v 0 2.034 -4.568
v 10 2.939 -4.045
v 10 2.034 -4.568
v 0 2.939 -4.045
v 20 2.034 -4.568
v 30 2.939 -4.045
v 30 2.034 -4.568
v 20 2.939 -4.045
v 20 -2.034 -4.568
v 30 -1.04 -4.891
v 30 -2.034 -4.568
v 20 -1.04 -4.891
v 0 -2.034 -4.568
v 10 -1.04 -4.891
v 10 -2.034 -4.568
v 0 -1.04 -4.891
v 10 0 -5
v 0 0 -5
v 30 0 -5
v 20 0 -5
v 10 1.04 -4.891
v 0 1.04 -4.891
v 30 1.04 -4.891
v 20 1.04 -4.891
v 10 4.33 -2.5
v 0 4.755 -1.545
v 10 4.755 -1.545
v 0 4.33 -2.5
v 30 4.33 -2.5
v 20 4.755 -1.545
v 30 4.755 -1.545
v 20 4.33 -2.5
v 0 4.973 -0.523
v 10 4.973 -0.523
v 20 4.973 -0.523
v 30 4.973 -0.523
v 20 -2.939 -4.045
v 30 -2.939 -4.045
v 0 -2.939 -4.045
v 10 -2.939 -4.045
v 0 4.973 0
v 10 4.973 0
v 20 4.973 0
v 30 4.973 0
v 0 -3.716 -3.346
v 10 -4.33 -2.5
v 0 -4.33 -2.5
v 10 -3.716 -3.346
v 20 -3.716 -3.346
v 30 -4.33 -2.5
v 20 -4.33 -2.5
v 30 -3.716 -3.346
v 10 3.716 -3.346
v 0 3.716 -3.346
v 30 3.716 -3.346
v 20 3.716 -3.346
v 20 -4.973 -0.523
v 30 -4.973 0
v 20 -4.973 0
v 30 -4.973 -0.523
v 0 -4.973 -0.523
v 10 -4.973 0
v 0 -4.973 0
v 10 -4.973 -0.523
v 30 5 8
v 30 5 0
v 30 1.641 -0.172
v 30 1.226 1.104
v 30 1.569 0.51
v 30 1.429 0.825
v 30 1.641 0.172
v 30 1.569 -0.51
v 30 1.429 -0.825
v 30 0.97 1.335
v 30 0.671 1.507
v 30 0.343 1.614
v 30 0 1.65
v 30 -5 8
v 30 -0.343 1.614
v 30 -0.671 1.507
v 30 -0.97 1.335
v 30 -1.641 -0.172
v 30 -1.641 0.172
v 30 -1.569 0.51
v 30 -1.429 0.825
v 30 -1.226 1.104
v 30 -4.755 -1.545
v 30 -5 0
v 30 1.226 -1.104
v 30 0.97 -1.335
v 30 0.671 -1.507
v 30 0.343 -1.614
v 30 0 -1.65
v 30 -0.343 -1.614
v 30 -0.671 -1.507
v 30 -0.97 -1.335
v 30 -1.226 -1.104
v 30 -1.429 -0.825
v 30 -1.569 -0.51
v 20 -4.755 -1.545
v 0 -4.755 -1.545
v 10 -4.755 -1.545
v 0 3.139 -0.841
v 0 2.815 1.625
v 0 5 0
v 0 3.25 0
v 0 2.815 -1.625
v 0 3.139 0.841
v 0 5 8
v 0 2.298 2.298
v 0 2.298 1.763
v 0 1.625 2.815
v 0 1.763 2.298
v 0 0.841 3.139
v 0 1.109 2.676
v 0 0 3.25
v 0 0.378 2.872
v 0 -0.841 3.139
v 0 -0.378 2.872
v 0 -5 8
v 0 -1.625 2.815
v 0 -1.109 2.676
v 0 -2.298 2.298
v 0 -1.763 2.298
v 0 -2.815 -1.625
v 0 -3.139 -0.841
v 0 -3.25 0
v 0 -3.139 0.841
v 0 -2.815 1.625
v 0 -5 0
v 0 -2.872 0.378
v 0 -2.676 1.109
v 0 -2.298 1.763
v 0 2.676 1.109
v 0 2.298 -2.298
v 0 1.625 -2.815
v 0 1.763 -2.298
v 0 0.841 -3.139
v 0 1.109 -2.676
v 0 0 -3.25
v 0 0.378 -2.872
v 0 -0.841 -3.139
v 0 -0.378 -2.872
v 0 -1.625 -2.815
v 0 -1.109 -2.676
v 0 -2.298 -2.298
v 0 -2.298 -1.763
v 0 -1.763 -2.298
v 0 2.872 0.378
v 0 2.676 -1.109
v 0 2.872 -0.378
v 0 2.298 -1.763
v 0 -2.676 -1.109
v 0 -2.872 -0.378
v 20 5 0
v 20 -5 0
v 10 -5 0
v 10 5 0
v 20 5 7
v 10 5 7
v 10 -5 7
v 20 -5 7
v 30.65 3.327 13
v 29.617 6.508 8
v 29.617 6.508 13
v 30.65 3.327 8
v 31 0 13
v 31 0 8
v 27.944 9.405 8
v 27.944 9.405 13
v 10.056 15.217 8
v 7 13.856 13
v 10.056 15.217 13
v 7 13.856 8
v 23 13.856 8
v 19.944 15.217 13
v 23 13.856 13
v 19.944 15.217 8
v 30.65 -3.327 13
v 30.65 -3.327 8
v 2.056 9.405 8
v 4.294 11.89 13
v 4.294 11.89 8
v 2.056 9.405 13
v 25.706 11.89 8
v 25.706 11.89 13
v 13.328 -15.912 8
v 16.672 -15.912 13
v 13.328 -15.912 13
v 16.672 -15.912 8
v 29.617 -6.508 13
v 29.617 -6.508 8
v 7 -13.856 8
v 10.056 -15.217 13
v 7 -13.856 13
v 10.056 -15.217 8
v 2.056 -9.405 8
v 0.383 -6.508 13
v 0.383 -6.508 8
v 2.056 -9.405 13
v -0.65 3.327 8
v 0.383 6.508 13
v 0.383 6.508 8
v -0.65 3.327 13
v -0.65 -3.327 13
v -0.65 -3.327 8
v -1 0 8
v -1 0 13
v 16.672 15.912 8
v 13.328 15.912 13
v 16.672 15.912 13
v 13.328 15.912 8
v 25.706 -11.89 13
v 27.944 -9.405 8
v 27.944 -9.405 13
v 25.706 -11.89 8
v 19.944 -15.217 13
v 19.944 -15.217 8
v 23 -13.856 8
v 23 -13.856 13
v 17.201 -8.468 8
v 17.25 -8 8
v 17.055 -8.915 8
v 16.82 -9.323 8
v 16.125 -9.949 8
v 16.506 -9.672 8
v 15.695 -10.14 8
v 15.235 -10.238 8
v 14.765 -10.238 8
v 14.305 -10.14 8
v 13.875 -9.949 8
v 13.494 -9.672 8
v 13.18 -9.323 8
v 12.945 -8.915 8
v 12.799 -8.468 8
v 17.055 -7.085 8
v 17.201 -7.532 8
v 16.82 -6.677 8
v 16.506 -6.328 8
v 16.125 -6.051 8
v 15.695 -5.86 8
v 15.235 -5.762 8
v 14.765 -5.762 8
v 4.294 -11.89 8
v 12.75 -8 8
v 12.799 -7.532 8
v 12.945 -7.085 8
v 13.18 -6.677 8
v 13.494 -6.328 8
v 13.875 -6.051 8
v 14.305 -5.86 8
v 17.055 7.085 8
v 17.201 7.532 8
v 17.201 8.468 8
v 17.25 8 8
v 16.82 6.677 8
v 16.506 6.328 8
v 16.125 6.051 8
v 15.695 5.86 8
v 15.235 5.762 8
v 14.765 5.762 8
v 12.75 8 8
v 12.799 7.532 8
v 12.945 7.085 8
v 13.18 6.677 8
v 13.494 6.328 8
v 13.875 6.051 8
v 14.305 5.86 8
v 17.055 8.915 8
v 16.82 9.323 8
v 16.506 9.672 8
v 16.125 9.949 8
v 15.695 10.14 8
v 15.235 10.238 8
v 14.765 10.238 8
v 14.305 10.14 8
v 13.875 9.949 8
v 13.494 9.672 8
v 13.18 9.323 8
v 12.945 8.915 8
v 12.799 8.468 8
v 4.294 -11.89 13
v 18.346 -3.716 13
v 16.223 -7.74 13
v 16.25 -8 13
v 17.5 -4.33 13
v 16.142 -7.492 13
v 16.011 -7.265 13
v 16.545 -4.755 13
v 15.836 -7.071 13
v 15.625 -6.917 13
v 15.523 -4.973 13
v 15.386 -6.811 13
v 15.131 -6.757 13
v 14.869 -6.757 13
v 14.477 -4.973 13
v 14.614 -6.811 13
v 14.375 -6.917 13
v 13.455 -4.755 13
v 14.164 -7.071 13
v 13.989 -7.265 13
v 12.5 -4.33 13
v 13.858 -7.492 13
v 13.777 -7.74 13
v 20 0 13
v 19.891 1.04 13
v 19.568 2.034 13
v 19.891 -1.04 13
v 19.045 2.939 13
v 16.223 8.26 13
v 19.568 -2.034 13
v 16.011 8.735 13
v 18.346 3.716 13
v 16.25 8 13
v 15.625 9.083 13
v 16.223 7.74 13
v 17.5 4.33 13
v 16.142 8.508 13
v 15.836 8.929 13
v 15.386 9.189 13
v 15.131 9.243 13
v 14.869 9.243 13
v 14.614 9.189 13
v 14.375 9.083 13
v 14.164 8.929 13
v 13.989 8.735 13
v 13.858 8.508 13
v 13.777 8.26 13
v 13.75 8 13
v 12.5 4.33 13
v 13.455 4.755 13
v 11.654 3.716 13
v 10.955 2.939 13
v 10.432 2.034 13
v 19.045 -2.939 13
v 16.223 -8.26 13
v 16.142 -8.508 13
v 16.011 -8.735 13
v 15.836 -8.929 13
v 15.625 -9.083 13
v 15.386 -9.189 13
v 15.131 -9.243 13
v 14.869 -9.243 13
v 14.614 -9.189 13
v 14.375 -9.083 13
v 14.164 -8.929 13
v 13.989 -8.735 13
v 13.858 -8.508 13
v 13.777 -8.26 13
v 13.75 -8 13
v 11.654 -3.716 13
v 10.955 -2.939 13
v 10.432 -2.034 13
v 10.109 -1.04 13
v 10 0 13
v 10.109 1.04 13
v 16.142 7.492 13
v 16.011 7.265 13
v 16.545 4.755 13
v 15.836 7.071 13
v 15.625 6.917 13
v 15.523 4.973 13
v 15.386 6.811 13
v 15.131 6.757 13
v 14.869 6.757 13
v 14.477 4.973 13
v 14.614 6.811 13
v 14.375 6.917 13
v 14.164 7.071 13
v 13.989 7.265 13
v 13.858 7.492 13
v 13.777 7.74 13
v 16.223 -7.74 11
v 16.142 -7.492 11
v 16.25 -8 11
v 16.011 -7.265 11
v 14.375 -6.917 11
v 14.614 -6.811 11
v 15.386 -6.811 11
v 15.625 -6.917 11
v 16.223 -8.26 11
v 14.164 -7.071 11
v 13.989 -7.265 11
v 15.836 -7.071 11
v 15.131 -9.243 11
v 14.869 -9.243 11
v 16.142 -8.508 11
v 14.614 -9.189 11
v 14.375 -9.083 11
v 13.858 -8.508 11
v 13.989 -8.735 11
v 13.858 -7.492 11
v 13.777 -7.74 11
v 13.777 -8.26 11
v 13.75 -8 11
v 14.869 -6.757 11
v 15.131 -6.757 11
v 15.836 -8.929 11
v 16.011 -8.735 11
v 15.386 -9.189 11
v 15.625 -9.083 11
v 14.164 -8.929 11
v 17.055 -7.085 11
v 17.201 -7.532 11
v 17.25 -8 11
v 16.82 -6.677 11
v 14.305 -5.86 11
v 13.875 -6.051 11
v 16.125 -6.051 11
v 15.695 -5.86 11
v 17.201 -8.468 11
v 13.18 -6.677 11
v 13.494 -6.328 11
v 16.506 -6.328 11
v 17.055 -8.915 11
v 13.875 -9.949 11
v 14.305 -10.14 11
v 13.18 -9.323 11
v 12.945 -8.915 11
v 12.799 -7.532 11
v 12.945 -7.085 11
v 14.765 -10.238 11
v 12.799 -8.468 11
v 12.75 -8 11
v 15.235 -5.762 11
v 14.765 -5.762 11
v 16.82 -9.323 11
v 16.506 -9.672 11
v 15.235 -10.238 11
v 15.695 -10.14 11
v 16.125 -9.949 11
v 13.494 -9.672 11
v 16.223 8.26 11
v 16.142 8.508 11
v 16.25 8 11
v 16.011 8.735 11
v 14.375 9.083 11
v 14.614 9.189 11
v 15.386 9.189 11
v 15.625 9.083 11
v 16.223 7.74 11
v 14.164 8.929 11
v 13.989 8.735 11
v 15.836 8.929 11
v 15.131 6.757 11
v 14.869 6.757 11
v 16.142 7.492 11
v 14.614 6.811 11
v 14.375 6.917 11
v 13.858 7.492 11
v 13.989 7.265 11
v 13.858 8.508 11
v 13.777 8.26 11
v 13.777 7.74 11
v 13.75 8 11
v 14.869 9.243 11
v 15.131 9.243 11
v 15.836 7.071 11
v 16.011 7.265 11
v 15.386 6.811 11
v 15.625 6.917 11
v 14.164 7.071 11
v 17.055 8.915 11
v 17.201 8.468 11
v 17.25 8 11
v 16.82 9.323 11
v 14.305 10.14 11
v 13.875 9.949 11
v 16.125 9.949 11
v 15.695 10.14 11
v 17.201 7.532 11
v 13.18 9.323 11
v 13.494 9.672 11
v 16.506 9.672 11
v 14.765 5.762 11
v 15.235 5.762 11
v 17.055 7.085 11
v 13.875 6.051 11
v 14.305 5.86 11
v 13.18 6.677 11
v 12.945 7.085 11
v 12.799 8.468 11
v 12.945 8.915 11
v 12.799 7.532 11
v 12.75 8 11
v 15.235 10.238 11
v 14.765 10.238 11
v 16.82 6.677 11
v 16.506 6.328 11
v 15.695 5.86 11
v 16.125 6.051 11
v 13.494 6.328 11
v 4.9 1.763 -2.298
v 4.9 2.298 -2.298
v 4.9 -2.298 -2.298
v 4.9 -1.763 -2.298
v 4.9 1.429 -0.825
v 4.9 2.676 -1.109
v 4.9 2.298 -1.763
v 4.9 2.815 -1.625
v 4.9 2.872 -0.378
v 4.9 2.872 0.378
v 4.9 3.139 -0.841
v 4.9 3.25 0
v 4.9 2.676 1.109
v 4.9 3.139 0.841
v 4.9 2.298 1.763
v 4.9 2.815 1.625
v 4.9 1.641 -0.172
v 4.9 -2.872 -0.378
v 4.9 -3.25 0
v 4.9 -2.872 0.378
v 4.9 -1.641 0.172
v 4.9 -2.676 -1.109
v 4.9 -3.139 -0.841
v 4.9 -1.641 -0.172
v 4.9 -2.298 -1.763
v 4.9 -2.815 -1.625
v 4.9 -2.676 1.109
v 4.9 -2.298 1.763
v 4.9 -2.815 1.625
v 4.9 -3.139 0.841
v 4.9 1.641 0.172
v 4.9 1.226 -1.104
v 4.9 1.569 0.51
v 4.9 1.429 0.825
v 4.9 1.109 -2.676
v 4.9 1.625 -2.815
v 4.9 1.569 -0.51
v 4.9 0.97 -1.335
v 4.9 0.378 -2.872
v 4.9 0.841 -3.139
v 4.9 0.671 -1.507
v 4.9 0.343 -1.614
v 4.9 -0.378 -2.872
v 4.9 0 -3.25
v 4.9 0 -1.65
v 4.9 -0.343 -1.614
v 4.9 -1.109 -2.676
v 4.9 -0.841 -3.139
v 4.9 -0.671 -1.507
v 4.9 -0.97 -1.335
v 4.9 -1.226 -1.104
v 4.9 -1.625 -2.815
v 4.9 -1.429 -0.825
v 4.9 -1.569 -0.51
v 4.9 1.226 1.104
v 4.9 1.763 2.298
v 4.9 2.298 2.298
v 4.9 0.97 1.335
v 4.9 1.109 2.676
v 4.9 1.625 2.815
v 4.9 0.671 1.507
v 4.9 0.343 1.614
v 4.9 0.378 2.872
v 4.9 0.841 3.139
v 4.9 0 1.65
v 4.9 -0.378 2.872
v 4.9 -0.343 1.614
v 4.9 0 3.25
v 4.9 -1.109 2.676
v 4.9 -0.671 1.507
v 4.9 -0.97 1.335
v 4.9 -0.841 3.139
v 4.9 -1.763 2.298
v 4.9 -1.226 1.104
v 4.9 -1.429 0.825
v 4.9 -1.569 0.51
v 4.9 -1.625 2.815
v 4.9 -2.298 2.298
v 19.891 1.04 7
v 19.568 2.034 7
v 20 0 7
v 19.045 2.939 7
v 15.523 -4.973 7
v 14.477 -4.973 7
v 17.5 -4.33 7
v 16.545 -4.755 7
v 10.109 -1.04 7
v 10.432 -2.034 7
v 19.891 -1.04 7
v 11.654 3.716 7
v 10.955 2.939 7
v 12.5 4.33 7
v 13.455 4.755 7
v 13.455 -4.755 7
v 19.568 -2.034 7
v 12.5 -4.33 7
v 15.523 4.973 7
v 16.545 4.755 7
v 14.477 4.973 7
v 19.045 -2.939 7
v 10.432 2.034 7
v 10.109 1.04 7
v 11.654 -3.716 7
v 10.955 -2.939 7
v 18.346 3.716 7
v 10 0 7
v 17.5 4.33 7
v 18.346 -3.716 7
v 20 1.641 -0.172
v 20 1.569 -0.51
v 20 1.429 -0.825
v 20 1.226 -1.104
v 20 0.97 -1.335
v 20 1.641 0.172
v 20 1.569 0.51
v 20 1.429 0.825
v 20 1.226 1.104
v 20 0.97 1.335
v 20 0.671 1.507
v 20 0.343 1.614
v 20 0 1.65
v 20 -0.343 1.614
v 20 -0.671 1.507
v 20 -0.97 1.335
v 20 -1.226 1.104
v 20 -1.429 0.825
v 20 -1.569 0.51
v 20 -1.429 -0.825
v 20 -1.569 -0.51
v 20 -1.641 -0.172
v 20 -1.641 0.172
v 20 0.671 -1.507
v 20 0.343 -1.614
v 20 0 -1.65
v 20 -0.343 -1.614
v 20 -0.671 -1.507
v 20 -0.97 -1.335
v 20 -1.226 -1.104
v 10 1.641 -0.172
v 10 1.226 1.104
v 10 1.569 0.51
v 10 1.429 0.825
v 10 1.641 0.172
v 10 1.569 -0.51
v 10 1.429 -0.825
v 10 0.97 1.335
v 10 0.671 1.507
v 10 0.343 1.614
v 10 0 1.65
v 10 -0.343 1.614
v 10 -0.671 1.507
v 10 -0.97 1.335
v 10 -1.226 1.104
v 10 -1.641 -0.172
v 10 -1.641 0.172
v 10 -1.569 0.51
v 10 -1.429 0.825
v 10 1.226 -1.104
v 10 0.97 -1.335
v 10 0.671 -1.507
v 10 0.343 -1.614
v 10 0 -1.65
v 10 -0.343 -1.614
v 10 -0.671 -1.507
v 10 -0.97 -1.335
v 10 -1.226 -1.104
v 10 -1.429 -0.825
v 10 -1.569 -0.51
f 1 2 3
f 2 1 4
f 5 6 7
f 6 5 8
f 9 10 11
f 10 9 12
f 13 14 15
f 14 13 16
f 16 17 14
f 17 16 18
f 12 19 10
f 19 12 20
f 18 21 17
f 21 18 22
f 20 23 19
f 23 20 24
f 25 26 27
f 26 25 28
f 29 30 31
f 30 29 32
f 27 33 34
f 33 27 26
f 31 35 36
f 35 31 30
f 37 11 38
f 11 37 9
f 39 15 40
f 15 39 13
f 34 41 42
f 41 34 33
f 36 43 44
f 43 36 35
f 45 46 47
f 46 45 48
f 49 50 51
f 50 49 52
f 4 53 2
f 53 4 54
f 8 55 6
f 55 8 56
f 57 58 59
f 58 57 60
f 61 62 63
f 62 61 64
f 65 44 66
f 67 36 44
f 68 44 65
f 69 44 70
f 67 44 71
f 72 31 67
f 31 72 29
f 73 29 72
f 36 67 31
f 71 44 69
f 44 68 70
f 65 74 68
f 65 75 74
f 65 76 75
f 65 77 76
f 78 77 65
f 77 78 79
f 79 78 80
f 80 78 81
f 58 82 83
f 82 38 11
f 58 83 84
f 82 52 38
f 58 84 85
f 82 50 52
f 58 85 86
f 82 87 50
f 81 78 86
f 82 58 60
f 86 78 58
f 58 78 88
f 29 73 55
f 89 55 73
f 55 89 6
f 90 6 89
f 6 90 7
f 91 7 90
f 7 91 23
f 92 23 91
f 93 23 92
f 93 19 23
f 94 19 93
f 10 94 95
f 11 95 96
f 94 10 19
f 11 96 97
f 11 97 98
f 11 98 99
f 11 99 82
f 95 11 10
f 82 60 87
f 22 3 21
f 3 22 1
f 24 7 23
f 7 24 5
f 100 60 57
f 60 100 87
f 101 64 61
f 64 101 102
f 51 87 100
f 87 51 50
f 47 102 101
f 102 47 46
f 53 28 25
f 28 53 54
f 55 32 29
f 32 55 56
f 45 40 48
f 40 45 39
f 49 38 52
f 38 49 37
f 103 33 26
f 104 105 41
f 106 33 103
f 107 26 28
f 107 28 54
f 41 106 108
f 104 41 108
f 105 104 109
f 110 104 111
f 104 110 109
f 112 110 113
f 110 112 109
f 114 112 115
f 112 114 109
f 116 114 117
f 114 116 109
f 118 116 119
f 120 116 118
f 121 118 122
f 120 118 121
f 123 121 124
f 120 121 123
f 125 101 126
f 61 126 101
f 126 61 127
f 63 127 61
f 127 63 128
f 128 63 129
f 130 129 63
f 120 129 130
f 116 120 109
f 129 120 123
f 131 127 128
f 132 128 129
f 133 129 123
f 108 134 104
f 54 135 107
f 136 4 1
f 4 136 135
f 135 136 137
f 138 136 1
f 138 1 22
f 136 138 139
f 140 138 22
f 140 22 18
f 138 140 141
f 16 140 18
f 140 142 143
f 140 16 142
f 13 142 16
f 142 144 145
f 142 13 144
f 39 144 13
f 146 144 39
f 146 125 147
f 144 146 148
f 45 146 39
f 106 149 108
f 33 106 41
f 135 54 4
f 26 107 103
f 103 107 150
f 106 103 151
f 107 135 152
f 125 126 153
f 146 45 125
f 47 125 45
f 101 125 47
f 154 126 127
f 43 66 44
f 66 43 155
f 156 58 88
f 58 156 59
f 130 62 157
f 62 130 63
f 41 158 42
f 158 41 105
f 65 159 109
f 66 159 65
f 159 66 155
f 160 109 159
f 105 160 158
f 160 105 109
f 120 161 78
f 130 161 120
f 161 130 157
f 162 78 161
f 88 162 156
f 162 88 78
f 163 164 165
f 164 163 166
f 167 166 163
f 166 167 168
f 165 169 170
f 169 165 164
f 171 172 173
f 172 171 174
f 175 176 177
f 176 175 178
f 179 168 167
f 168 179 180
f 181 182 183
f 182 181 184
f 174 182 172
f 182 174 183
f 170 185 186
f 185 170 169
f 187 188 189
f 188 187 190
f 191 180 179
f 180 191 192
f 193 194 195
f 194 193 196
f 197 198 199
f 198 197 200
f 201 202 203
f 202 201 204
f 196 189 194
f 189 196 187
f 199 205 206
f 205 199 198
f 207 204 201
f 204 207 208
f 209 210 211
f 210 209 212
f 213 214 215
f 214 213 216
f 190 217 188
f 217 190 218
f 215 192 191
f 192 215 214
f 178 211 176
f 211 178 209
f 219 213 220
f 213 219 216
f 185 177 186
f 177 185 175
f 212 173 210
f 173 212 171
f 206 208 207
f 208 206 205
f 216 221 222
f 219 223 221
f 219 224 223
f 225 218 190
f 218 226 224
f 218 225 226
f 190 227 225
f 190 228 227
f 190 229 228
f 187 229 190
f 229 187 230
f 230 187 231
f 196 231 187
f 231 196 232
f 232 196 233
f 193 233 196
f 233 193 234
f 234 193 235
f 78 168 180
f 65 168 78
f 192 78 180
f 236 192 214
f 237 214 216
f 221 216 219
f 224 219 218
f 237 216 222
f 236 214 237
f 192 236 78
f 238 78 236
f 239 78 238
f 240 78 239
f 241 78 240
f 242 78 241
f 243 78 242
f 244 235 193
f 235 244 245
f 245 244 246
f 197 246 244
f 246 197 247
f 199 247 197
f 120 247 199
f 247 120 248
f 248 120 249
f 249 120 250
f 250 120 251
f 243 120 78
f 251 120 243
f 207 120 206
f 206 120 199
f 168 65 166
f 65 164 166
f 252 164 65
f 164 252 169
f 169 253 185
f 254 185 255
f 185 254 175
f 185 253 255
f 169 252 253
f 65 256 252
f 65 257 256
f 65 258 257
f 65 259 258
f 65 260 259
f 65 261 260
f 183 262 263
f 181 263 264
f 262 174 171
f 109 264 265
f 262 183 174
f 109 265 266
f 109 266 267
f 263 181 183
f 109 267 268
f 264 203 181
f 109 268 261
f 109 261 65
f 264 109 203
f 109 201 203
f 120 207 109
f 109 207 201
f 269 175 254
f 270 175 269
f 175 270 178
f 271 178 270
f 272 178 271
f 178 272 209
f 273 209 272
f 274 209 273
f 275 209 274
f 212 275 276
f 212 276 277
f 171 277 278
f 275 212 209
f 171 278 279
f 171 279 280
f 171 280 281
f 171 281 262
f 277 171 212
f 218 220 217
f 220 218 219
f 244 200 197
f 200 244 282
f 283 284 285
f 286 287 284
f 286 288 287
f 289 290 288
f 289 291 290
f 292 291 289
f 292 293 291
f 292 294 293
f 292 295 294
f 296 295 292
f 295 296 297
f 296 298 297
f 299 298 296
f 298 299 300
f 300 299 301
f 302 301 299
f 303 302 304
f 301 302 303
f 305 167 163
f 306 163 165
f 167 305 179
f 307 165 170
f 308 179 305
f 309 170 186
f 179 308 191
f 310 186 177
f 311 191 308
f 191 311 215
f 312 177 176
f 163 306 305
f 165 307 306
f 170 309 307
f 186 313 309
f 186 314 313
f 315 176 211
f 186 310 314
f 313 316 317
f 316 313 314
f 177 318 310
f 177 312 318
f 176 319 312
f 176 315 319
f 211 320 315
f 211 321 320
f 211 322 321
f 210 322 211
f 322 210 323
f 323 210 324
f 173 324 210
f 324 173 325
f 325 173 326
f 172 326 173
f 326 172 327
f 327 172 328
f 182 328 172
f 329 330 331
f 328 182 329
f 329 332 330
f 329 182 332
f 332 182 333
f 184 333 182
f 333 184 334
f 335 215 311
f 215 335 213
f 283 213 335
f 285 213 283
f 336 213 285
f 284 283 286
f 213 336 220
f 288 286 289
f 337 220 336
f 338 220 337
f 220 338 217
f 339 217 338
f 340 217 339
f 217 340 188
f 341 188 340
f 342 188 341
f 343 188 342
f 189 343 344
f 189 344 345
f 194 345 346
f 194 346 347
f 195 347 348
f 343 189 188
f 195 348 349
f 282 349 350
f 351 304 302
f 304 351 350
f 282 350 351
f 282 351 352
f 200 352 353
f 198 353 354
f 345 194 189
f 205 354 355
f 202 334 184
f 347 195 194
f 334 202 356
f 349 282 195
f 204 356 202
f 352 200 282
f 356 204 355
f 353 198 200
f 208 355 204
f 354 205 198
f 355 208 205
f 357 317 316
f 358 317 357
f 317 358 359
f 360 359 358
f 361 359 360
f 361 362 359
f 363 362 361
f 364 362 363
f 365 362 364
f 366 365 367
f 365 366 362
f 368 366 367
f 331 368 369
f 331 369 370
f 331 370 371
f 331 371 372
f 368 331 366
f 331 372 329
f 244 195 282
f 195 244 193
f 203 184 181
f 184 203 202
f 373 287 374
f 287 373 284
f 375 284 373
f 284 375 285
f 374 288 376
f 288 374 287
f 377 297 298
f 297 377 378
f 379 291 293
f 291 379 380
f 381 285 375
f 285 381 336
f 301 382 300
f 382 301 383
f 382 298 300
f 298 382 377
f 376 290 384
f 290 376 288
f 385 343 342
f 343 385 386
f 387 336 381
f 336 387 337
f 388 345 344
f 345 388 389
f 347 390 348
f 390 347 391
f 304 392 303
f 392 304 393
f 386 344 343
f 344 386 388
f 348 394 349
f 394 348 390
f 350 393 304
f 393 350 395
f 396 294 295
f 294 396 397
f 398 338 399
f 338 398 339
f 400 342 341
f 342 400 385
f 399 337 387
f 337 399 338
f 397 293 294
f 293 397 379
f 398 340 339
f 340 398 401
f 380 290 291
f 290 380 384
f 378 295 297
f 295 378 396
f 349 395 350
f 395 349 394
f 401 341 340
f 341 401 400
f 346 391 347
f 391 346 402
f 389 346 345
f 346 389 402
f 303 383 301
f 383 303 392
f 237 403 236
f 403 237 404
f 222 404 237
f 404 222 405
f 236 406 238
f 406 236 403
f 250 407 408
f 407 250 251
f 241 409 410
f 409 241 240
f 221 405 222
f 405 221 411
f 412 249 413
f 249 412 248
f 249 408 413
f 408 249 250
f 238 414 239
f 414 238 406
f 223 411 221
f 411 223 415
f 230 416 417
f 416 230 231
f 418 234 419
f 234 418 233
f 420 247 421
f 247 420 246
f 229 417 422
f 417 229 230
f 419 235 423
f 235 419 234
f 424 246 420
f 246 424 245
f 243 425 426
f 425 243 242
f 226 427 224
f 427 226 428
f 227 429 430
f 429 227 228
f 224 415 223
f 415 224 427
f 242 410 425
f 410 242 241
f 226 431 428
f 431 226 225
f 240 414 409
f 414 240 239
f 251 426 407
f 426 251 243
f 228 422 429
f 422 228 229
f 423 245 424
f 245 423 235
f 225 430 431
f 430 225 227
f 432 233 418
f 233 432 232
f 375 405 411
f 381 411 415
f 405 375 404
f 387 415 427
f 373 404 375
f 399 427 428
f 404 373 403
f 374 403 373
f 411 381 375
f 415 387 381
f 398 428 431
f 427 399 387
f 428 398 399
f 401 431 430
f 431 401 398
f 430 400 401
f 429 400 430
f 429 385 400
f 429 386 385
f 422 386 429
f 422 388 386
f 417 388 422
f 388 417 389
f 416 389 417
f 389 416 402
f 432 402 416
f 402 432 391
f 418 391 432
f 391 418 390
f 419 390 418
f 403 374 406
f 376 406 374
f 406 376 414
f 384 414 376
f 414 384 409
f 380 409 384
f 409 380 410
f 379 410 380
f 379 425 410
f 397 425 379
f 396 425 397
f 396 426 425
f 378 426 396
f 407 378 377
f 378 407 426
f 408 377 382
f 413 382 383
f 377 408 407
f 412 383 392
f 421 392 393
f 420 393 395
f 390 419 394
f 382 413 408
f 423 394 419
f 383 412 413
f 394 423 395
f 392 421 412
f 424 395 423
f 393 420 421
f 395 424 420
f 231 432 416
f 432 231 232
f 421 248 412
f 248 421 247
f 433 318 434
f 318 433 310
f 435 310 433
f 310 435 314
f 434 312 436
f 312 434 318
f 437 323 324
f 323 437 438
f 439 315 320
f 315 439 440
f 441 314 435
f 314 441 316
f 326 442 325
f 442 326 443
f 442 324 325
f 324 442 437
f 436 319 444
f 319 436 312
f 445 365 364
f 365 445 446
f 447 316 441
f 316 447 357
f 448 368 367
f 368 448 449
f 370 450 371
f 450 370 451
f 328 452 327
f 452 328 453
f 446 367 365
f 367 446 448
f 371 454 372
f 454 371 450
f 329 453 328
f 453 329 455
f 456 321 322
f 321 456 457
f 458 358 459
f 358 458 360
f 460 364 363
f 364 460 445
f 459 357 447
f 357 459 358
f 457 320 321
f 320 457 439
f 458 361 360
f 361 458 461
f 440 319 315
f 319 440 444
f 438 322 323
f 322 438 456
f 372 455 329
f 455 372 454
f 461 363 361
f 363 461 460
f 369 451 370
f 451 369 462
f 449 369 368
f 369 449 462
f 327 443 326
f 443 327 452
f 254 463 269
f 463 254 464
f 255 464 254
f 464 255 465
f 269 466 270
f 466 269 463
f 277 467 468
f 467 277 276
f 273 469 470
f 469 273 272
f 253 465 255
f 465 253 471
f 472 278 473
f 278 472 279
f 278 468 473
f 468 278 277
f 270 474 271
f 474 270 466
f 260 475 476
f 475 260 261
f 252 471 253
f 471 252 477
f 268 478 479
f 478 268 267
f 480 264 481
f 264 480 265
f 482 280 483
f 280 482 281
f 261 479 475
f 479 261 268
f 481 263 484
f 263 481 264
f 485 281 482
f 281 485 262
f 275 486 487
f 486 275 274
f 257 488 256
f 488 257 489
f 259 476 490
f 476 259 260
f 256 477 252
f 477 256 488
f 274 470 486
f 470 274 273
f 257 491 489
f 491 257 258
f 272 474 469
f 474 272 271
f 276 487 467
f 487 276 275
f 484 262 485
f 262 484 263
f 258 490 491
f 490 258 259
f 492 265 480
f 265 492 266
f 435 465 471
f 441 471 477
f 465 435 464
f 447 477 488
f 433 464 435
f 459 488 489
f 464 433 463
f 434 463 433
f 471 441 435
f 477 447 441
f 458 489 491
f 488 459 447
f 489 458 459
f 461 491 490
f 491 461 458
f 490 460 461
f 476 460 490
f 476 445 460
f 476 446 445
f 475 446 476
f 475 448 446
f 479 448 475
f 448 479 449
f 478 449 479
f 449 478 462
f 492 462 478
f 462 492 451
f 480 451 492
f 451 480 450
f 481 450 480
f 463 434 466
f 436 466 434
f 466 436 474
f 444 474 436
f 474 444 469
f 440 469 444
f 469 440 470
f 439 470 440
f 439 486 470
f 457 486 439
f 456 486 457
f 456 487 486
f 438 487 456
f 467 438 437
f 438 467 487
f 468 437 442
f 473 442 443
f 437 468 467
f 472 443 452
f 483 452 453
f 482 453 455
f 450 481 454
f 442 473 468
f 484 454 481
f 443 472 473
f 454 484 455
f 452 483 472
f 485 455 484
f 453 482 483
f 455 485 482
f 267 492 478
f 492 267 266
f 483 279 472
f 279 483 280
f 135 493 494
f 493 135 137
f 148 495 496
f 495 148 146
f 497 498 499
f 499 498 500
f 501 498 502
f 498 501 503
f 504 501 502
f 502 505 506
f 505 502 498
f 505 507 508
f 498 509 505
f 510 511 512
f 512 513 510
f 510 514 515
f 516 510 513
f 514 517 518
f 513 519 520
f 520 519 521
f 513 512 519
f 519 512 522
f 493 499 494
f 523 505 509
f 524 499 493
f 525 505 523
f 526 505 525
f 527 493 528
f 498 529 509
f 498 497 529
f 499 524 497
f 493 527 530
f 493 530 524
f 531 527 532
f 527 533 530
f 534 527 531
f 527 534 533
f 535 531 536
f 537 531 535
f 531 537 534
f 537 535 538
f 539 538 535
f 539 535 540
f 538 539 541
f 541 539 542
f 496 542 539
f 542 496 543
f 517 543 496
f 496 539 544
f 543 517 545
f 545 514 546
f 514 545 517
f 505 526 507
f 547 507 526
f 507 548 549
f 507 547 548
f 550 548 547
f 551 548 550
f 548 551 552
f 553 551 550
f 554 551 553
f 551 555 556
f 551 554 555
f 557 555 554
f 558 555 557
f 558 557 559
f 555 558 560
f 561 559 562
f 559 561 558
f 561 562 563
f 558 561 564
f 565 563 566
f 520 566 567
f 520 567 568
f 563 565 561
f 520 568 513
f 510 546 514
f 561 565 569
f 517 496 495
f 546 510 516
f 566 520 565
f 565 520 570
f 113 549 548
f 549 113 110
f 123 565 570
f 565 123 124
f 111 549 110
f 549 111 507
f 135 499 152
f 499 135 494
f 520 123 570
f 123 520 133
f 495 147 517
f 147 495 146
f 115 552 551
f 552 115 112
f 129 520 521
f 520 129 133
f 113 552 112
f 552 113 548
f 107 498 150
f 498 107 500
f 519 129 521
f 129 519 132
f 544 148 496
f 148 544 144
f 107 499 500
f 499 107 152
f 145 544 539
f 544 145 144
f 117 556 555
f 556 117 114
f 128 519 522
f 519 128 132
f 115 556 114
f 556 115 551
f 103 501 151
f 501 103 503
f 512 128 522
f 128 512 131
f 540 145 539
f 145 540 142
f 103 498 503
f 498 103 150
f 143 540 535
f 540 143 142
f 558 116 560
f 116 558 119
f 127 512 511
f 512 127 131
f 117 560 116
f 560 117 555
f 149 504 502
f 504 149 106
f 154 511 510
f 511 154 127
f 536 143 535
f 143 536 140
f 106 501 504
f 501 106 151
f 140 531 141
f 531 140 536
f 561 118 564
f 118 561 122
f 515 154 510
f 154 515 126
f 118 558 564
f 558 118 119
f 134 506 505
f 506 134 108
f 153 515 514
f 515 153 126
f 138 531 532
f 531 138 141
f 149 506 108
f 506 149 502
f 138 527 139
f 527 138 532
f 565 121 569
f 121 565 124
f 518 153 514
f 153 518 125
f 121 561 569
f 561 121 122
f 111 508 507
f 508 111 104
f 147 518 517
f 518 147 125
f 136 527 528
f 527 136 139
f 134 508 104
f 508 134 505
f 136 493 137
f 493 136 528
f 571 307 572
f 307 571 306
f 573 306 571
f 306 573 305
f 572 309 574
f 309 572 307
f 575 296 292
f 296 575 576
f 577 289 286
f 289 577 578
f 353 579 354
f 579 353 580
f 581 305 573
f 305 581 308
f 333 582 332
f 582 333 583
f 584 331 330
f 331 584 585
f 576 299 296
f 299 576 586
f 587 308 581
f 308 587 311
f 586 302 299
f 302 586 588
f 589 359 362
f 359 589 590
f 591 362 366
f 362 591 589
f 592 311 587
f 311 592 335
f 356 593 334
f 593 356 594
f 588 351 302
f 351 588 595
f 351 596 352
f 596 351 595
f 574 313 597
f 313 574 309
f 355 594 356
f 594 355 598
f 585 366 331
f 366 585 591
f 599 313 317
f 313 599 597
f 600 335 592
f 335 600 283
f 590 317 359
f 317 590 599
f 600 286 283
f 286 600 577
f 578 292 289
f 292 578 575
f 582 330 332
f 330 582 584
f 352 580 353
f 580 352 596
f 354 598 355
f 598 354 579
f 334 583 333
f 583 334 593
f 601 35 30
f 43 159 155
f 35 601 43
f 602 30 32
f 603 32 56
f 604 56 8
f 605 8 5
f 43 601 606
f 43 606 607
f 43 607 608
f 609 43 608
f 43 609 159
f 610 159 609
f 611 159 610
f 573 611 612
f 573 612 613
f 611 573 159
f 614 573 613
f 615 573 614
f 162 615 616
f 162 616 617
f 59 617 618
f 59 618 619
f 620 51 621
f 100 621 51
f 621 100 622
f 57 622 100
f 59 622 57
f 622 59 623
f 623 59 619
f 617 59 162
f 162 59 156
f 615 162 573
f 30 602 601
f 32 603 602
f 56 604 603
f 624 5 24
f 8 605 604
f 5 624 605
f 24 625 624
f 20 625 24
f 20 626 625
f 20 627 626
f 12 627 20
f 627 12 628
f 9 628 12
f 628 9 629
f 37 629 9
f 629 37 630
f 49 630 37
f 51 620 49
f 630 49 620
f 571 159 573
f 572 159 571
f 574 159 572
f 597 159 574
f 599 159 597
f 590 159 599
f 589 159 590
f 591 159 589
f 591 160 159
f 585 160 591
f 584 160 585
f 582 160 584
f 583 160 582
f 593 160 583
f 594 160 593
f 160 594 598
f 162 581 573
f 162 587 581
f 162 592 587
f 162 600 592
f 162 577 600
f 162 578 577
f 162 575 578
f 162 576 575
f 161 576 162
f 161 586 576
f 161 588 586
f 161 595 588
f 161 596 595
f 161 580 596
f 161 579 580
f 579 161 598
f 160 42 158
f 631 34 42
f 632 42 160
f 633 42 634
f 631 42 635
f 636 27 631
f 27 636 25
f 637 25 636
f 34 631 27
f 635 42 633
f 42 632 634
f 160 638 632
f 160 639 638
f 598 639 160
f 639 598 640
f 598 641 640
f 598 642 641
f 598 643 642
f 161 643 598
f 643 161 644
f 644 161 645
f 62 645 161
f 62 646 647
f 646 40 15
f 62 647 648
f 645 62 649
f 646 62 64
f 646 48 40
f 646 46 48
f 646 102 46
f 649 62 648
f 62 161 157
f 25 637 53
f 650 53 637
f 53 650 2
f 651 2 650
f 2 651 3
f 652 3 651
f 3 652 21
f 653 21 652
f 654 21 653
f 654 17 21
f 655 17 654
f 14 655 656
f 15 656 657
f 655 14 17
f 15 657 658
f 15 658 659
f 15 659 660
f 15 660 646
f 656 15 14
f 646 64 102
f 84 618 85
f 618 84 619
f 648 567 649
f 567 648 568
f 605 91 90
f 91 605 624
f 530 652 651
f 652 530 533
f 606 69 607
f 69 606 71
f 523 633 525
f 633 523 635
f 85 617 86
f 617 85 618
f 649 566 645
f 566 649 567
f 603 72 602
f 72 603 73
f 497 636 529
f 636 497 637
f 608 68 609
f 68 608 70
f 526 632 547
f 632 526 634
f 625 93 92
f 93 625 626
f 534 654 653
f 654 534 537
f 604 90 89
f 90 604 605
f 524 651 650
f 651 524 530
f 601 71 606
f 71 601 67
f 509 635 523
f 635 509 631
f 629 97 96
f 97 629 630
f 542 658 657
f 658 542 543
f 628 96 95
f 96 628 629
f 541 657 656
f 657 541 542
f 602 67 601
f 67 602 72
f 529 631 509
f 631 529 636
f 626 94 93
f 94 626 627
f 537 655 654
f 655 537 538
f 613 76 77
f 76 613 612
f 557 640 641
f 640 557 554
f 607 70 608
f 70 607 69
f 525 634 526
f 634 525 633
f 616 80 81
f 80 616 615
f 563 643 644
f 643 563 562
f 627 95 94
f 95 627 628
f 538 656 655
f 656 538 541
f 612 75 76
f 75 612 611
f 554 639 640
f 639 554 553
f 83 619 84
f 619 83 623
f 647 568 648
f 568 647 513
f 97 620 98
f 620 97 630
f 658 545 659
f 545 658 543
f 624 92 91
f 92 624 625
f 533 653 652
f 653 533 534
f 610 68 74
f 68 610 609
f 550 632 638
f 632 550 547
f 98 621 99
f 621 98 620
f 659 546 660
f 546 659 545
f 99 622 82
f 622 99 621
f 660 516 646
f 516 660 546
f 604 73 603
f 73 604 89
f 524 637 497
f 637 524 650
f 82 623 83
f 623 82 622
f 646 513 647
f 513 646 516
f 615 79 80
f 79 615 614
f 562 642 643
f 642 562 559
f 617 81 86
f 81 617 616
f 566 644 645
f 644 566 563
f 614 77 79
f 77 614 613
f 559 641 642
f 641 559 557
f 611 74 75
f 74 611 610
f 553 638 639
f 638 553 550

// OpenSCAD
$fn = 30;

module servoCogs()
{
    length = 5;
    max_diameter = 6.5;

    cog_amount = 24;

    cube_size = max_diameter / sqrt(2);
    for(i = [0:24/4])
    {
        rotate(i / (24) * 360)
        translate(-[1,1,0]*cube_size/2)
        cube([cube_size, cube_size, length]);
    }
}

module topPart()
{
    bracket_length = 10;
    width = 10;
    screw_diameter = 3.3;

    total_length = bracket_length * 3;

    motor_screw_distance = 16;
    motor_screw_diameter = 2.5;
    motor_screwhead_diameter = 4.5;

    mount_height = width * 4 / 5;
    difference () 
    {
        union()
        {
            //Bottom cylinder
            rotate(90, [0,1,0])
            cylinder(h = total_length, d=width);

            //Cube thing
            translate([0,-width/2,0])
            cube([total_length, width, width]);

            //Actual motor mount
            translate([total_length / 2, 0, mount_height])
            cylinder(d=bracket_length * 3.2, h = width / 2);
        }

        //Motor screwholes
        translate([total_length / 2, 0 ,0])
        for(i = [-1,1])
        {
            translate([0, motor_screw_distance / 2 * i, 0])
            {
                cylinder(d=motor_screw_diameter, h = 100);

                translate([0,0,mount_height])
                cylinder(d=motor_screwhead_diameter, h=3);
            }
        }

        
        //Hole for the motor shaft
        translate([total_length / 2, 0, 0])
        cylinder(d = 10, h = 100);

        //Hole for the mount
        translate([total_length / 2 - width / 2, - width / 2, -width / 2])
        cube([width, width, width + 2]);

        //Screwhole
        rotate(90, [0,1,0])
        cylinder(h = total_length, d=screw_diameter);

        //Servo cog things
        translate([-0.1,0,0])
        rotate(90, [0,1,0])
        servoCogs();
    }

}

topPart();
